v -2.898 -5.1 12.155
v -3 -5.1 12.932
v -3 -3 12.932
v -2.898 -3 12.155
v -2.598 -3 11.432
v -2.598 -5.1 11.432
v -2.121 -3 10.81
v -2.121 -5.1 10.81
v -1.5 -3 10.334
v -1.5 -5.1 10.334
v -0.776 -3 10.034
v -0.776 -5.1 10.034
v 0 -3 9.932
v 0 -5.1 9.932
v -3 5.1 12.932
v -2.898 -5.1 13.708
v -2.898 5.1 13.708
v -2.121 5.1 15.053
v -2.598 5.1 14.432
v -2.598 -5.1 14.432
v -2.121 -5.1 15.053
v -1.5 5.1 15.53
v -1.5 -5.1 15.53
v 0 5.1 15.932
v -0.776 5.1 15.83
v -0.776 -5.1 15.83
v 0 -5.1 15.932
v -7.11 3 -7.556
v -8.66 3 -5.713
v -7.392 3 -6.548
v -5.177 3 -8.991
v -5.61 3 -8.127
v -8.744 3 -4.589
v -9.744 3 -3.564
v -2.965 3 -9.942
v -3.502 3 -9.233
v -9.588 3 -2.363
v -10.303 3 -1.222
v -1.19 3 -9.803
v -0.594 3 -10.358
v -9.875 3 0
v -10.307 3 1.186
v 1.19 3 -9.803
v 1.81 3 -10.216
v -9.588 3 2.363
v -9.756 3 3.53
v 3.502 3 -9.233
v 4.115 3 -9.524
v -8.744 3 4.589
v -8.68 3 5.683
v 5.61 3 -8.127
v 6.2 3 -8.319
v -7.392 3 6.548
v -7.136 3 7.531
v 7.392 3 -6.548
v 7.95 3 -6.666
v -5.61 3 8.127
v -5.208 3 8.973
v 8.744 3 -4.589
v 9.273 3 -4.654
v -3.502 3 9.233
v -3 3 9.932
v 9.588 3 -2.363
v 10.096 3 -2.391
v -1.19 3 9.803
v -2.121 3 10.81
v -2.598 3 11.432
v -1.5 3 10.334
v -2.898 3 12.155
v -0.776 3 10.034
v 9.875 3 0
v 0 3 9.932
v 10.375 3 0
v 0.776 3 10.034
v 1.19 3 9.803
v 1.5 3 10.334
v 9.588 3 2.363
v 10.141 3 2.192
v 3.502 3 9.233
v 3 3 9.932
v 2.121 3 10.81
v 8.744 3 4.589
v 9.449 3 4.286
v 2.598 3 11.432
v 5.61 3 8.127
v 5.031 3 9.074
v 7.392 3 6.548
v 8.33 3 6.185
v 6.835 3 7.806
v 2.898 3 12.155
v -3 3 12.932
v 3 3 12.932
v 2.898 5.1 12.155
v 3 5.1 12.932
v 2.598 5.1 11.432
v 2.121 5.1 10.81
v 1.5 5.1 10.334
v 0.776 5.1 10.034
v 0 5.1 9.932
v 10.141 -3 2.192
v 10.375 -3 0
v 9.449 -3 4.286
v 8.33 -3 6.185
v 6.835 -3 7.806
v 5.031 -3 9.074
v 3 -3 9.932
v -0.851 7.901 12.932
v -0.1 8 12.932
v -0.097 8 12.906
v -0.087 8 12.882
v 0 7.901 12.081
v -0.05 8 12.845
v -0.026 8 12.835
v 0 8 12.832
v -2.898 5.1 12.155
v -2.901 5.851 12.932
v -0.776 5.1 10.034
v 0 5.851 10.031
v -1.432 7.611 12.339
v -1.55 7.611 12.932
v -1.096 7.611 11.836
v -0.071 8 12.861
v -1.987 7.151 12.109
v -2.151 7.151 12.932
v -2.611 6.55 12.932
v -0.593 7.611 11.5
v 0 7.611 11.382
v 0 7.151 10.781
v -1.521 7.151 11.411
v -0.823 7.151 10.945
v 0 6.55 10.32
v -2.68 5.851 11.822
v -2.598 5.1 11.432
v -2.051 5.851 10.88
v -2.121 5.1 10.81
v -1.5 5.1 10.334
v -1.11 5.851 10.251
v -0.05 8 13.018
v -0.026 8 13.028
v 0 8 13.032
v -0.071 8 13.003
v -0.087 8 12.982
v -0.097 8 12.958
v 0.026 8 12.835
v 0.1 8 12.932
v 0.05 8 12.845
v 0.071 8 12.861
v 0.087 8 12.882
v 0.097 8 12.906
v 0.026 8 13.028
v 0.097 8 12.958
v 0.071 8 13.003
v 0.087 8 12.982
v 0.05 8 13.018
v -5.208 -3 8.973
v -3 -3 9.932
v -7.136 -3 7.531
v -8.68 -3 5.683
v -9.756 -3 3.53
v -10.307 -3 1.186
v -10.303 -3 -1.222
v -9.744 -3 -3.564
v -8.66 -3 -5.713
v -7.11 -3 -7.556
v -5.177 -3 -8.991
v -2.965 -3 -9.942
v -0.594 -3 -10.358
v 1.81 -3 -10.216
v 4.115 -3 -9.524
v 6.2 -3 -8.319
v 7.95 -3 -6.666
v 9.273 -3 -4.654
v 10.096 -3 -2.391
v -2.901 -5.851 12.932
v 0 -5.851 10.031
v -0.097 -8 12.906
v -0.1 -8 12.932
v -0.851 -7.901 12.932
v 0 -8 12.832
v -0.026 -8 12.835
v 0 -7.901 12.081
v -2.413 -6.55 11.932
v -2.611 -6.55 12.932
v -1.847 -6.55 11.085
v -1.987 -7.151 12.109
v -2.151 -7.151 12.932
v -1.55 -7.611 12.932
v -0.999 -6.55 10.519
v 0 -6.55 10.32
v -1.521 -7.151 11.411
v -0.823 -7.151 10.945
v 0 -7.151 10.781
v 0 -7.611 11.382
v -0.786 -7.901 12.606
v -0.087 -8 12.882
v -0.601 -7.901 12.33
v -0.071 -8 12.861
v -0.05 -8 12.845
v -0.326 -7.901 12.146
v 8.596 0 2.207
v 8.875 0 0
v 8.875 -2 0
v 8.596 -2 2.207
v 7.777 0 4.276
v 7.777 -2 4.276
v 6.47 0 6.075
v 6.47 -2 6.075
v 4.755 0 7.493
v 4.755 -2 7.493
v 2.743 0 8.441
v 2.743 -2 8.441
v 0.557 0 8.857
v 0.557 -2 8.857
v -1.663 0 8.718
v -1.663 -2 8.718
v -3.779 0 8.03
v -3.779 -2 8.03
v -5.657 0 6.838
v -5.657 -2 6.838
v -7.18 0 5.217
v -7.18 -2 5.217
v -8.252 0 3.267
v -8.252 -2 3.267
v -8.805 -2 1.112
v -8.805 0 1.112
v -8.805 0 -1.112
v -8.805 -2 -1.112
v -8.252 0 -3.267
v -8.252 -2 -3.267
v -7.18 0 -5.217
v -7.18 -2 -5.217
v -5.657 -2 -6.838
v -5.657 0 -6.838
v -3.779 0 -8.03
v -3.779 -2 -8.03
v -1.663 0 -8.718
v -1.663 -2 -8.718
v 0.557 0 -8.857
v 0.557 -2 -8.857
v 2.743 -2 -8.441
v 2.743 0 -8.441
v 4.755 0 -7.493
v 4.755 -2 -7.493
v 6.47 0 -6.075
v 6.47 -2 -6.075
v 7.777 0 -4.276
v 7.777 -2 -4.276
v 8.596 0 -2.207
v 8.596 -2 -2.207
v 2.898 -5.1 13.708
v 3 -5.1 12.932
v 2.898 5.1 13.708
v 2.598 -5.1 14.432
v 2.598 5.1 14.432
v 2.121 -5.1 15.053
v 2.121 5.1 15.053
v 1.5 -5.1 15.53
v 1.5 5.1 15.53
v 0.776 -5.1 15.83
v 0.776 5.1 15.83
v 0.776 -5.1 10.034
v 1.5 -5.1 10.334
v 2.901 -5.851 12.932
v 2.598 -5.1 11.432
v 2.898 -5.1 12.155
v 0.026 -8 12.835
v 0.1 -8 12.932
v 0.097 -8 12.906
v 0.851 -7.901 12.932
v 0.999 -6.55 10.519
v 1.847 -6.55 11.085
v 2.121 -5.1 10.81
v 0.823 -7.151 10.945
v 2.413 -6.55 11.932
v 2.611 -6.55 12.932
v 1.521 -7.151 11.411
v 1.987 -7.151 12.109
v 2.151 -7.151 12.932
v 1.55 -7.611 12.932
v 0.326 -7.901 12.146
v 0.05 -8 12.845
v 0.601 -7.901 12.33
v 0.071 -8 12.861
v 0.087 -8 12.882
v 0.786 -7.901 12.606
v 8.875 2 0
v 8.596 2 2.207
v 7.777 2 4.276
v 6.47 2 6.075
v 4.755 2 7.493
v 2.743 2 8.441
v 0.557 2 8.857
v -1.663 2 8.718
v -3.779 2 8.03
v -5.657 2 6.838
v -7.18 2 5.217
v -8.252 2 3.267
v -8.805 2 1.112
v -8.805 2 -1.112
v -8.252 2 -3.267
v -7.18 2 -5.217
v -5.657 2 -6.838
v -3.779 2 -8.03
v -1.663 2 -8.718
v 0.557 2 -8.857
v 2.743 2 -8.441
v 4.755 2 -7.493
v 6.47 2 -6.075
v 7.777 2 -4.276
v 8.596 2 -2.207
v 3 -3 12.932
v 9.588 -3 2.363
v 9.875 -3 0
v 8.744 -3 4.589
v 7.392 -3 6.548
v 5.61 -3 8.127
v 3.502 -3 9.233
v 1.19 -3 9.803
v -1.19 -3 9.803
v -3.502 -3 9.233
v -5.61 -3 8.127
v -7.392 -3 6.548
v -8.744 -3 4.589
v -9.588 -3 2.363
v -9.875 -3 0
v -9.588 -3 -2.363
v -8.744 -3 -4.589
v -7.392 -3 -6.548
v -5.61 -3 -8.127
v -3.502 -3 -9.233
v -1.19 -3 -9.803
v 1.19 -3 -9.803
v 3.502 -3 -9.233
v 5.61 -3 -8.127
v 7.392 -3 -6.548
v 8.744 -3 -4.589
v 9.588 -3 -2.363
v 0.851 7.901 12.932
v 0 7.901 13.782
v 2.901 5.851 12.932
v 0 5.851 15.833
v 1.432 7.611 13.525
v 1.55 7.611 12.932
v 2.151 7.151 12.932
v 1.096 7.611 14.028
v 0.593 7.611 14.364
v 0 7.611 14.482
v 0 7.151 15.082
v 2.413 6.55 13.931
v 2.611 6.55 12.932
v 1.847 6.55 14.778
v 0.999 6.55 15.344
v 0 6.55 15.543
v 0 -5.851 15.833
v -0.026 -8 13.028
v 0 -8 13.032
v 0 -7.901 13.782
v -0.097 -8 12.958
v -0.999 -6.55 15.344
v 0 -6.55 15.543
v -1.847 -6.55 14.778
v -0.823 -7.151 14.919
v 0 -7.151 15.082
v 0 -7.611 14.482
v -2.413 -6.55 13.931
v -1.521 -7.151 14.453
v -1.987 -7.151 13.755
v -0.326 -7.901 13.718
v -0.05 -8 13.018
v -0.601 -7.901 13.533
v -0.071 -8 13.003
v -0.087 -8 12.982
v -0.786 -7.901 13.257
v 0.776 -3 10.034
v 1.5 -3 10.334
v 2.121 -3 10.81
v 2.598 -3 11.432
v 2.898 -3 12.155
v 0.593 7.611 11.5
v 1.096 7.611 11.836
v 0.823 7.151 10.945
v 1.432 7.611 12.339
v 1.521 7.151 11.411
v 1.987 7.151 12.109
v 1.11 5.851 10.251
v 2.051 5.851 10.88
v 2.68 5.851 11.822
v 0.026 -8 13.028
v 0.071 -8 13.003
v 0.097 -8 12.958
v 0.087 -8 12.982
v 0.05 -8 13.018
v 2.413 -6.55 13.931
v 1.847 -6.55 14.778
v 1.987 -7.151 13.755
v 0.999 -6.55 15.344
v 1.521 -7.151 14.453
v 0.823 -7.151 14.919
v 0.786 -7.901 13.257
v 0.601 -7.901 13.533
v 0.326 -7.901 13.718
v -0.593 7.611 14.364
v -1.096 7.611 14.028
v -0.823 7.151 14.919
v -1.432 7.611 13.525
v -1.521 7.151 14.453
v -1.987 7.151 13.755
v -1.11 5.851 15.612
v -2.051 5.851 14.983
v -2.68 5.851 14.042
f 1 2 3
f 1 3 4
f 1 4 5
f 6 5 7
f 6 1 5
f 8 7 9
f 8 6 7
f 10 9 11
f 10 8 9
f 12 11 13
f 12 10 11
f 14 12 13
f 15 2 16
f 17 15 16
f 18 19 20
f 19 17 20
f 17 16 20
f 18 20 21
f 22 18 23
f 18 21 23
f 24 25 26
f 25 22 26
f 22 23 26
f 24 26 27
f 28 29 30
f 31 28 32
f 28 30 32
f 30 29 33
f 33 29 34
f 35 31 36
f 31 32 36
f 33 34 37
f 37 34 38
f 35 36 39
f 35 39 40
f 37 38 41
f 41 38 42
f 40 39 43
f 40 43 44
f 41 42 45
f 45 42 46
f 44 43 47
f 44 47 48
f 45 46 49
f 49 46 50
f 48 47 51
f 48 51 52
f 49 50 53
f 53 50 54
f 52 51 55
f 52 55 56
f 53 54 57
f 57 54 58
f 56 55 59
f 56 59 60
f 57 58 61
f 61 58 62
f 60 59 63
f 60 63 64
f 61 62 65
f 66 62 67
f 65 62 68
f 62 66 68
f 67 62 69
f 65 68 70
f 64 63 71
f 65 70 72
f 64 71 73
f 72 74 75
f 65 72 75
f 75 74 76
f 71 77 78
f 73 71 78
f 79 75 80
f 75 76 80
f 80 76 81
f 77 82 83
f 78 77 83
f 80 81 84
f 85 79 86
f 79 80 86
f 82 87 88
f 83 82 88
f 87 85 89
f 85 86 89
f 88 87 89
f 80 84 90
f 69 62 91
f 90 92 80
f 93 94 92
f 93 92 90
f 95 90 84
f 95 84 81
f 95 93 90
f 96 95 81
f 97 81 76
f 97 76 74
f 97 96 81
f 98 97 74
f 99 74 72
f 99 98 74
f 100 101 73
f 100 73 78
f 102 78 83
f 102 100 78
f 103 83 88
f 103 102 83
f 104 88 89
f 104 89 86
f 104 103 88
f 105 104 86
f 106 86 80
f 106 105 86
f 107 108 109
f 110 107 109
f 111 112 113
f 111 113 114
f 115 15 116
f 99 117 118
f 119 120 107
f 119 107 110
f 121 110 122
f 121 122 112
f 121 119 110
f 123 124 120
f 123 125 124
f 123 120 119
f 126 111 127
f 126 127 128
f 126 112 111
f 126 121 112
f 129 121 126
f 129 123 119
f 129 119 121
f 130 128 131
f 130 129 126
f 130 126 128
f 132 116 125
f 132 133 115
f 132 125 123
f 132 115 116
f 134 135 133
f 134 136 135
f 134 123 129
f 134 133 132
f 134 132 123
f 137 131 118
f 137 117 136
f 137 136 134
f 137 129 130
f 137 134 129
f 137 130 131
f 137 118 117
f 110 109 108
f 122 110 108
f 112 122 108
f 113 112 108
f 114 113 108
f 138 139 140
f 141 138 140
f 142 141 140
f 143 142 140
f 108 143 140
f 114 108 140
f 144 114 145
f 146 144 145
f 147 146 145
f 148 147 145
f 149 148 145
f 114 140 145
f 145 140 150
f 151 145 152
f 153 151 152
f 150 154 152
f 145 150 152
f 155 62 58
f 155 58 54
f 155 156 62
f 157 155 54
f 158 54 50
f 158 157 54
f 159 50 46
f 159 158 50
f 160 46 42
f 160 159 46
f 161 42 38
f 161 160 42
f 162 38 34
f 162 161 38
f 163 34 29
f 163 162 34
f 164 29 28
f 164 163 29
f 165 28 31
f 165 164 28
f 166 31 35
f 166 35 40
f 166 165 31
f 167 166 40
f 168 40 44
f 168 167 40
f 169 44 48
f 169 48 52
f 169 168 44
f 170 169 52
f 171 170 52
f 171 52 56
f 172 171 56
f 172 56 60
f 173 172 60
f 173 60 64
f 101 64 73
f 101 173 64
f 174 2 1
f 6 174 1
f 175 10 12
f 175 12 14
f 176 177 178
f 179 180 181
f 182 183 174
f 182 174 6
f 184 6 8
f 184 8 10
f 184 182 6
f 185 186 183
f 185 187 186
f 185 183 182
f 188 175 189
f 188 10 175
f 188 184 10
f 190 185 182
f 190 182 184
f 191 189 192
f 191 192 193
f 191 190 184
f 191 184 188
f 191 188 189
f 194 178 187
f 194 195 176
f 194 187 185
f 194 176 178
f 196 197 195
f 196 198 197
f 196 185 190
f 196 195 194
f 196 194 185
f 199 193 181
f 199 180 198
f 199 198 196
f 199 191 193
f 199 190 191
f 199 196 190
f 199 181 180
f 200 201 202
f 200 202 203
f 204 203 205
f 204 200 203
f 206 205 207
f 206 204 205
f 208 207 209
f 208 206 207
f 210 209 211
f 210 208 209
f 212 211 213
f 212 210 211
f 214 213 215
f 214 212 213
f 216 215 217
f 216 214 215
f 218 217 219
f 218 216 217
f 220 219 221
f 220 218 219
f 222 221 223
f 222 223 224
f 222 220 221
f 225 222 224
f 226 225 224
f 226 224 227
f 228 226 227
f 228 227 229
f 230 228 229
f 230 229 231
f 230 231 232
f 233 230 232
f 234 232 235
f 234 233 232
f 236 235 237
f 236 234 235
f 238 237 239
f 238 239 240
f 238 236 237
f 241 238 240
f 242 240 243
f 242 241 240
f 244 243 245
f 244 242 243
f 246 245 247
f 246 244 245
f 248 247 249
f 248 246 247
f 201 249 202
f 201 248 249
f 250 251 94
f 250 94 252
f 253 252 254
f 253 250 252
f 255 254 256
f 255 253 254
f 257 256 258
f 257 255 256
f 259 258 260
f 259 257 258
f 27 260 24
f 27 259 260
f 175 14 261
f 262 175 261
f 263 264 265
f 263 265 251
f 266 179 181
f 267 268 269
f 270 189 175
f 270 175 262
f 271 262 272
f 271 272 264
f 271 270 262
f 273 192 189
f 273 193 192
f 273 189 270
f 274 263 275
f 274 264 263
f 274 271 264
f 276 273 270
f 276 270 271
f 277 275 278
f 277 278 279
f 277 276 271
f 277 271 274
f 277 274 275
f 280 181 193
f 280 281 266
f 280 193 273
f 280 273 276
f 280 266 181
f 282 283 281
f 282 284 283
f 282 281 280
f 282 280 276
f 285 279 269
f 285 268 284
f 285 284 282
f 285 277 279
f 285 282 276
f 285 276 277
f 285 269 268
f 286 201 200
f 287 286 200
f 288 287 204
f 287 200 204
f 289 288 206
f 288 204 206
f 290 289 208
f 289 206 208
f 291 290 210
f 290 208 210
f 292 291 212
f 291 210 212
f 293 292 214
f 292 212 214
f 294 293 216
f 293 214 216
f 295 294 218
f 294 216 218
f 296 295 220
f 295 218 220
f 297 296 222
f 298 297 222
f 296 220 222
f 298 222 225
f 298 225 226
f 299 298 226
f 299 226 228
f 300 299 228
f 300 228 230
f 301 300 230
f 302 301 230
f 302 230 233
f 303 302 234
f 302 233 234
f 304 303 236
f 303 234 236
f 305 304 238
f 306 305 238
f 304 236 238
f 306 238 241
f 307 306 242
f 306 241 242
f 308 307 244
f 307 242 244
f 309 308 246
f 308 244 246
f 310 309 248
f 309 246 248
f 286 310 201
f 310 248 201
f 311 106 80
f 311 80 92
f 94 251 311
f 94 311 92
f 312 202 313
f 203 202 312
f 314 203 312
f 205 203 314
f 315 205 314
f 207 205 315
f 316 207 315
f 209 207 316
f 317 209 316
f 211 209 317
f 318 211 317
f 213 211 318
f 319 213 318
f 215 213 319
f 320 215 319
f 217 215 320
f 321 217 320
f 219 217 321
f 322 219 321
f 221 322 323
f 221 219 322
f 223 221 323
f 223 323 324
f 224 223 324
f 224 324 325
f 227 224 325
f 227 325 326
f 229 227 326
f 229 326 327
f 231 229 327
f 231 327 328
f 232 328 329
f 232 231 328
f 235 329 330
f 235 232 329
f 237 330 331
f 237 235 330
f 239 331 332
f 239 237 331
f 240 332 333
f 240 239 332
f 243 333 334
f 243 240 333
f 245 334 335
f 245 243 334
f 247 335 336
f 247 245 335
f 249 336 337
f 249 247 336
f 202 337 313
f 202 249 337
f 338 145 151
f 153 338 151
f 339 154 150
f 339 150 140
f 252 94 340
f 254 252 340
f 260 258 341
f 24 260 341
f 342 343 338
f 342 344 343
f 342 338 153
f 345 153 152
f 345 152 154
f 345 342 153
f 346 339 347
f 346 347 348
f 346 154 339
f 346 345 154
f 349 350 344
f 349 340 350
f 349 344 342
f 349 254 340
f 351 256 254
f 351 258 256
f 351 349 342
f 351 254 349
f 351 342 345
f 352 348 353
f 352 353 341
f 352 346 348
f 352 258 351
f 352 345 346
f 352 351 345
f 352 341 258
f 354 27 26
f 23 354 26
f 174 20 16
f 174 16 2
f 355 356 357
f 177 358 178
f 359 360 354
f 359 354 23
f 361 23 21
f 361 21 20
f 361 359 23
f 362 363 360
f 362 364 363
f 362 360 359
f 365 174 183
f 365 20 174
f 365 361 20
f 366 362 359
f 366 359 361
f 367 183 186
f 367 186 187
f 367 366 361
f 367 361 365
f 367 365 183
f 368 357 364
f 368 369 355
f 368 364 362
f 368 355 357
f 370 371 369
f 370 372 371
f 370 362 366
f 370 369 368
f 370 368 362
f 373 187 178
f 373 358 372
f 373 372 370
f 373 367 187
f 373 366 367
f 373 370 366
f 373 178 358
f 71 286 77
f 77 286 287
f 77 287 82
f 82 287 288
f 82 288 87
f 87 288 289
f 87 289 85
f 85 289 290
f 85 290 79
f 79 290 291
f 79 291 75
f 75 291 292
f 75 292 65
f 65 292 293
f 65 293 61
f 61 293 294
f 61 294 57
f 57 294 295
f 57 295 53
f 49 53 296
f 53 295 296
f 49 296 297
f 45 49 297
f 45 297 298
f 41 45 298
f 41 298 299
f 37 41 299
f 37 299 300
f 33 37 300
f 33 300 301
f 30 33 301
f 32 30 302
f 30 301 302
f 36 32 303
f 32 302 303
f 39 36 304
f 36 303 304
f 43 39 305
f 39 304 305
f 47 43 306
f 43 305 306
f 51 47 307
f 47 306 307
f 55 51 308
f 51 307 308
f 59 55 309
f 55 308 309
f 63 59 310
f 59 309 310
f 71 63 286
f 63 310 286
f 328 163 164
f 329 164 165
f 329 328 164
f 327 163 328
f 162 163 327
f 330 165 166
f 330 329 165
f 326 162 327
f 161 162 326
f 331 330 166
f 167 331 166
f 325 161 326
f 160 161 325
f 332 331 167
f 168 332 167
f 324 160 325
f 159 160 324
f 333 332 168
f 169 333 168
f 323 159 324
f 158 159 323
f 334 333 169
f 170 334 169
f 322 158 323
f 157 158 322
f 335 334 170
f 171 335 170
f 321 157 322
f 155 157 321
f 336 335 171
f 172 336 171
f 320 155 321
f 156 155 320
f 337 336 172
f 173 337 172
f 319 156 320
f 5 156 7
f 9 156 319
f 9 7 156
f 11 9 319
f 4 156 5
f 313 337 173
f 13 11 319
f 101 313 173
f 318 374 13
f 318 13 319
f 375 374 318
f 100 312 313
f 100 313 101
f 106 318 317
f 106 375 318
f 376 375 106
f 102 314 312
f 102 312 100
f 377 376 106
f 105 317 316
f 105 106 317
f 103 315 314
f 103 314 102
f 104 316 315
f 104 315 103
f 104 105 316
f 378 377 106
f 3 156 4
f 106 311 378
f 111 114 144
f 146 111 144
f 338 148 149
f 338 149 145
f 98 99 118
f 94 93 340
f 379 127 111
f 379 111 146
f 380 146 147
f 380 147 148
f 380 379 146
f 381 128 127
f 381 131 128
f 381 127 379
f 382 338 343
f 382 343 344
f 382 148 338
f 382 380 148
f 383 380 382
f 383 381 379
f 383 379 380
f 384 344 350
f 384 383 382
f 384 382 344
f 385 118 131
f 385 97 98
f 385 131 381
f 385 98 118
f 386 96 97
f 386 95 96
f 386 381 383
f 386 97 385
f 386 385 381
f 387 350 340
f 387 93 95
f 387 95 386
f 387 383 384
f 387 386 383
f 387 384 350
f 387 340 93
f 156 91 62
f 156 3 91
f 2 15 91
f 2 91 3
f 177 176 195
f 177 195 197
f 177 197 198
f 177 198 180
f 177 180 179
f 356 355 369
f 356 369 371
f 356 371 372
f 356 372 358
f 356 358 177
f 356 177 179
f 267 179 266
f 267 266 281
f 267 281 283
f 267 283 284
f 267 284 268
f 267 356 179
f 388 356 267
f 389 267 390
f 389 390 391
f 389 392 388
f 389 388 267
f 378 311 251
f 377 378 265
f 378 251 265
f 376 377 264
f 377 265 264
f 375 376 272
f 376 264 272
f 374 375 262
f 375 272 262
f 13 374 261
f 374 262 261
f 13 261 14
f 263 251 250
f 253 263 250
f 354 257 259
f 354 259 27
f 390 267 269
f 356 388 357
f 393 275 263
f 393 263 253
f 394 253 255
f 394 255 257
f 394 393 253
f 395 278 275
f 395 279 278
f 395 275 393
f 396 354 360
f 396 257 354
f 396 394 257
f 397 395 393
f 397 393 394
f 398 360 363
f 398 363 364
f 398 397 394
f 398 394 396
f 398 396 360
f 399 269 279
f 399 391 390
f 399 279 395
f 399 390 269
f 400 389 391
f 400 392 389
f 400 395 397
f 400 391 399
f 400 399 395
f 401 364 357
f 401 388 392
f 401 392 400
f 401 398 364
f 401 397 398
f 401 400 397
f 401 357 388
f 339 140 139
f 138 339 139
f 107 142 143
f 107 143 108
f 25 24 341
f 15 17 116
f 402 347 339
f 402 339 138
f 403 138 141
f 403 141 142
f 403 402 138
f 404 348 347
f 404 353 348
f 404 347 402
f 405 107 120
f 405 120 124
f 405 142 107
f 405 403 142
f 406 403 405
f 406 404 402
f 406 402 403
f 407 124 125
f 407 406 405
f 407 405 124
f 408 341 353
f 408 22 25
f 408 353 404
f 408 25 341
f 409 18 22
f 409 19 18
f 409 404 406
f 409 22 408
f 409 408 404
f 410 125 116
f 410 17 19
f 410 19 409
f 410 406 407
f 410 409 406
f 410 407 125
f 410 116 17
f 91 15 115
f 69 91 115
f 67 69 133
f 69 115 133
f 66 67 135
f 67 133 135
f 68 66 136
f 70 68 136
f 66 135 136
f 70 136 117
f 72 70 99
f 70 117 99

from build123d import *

# Parameters (mm, degrees)
F0_R          = 8.875
F1_DEPTH      = 3
F1_DEPTH_BACK = 3
F2_SIZE       = 1
F3_DEPTH      = 8
F3_DEPTH_BACK = 8
F4_R          = 2.99999
F5_R          = 2.9


# Not quite as in the source:
# - a fillet or chamfer is up to 0.001 mm smaller than in the source, because OpenCascade refuses the exact size
# - a feature names something its author has since deleted; it is built from what else it names


with BuildPart() as f1:
    # F0 (on Front) → F1 (new body, two sides)
    with BuildSketch(Plane.XZ) as f1_sk:
        with BuildLine():
            ThreePointArc((-3, 9.931798679), (-6.1852900094, -8.3296345958), (10.375, 0))
            ThreePointArc((10.375, 0), (8.3296345958, 6.1852900094), (3, 9.931798679))
            Line((3, 9.931798679), (-3, 9.931798679))
        make_face()
        Circle(F0_R, mode=Mode.SUBTRACT)
    extrude(amount=F1_DEPTH)
    extrude(f1_sk.sketch, amount=-F1_DEPTH_BACK)

    # F2
    f2_edges = [f1.edges().sort_by_distance(p)[0] for p in [
        (-8.875, -3, 0),
        (-8.875, 3, 0),
    ]]
    chamfer(f2_edges, length=F2_SIZE)

    # F0 (on Front) → F3 (join, two sides)
    with BuildSketch(Plane.XZ) as f3_sk:
        with BuildLine():
            ThreePointArc((-3, 9.931798679), (0, 10.375), (3, 9.931798679))
            Line((3, 9.931798679), (3, 15.931798679))
            Line((3, 15.931798679), (-3, 15.931798679))
            Line((-3, 15.931798679), (-3, 9.931798679))
        make_face()
        with BuildLine():
            Line((-3, 9.931798679), (3, 9.931798679))
            ThreePointArc((3, 9.931798679), (0, 10.375), (-3, 9.931798679))
        make_face()
    extrude(amount=F3_DEPTH)
    extrude(f3_sk.sketch, amount=-F3_DEPTH_BACK)

    # F4 (radius 3 in the source; OpenCascade refuses exactly that, so slightly less here)
    f4_edges = [f1.edges().sort_by_distance(p)[0] for p in [
        (-3, 0, 15.931799),
        (3, 0, 15.931799),
        (3, -5.5, 9.931799),
        (3, 5.5, 9.931799),
        (-3, -5.5, 9.931799),
        (-3, 5.5, 9.931799),
    ]]
    fillet(f4_edges, radius=F4_R)

    # F5
    f5_edges = [f1.edges().sort_by_distance(p)[0] for p in [
        (2.121323, -8, 15.053122),
        (2.121323, 8, 15.053122),
        (3, -8, 12.931799),
        (3, 8, 12.931799),
        (2.121323, -8, 10.810475),
        (0, -8, 9.931799),
        (0, -8, 15.931799),
        (-2.121323, -8, 10.810475),
        (-2.121323, -8, 15.053122),
        (-3, -8, 12.931799),
        (2.121323, 8, 10.810475),
        (0, 8, 9.931799),
        (0, 8, 15.931799),
        (-2.121323, 8, 10.810475),
        (-2.121323, 8, 15.053122),
        (-3, 8, 12.931799),
    ]]
    fillet(f5_edges, radius=F5_R)


solid = f1.part
